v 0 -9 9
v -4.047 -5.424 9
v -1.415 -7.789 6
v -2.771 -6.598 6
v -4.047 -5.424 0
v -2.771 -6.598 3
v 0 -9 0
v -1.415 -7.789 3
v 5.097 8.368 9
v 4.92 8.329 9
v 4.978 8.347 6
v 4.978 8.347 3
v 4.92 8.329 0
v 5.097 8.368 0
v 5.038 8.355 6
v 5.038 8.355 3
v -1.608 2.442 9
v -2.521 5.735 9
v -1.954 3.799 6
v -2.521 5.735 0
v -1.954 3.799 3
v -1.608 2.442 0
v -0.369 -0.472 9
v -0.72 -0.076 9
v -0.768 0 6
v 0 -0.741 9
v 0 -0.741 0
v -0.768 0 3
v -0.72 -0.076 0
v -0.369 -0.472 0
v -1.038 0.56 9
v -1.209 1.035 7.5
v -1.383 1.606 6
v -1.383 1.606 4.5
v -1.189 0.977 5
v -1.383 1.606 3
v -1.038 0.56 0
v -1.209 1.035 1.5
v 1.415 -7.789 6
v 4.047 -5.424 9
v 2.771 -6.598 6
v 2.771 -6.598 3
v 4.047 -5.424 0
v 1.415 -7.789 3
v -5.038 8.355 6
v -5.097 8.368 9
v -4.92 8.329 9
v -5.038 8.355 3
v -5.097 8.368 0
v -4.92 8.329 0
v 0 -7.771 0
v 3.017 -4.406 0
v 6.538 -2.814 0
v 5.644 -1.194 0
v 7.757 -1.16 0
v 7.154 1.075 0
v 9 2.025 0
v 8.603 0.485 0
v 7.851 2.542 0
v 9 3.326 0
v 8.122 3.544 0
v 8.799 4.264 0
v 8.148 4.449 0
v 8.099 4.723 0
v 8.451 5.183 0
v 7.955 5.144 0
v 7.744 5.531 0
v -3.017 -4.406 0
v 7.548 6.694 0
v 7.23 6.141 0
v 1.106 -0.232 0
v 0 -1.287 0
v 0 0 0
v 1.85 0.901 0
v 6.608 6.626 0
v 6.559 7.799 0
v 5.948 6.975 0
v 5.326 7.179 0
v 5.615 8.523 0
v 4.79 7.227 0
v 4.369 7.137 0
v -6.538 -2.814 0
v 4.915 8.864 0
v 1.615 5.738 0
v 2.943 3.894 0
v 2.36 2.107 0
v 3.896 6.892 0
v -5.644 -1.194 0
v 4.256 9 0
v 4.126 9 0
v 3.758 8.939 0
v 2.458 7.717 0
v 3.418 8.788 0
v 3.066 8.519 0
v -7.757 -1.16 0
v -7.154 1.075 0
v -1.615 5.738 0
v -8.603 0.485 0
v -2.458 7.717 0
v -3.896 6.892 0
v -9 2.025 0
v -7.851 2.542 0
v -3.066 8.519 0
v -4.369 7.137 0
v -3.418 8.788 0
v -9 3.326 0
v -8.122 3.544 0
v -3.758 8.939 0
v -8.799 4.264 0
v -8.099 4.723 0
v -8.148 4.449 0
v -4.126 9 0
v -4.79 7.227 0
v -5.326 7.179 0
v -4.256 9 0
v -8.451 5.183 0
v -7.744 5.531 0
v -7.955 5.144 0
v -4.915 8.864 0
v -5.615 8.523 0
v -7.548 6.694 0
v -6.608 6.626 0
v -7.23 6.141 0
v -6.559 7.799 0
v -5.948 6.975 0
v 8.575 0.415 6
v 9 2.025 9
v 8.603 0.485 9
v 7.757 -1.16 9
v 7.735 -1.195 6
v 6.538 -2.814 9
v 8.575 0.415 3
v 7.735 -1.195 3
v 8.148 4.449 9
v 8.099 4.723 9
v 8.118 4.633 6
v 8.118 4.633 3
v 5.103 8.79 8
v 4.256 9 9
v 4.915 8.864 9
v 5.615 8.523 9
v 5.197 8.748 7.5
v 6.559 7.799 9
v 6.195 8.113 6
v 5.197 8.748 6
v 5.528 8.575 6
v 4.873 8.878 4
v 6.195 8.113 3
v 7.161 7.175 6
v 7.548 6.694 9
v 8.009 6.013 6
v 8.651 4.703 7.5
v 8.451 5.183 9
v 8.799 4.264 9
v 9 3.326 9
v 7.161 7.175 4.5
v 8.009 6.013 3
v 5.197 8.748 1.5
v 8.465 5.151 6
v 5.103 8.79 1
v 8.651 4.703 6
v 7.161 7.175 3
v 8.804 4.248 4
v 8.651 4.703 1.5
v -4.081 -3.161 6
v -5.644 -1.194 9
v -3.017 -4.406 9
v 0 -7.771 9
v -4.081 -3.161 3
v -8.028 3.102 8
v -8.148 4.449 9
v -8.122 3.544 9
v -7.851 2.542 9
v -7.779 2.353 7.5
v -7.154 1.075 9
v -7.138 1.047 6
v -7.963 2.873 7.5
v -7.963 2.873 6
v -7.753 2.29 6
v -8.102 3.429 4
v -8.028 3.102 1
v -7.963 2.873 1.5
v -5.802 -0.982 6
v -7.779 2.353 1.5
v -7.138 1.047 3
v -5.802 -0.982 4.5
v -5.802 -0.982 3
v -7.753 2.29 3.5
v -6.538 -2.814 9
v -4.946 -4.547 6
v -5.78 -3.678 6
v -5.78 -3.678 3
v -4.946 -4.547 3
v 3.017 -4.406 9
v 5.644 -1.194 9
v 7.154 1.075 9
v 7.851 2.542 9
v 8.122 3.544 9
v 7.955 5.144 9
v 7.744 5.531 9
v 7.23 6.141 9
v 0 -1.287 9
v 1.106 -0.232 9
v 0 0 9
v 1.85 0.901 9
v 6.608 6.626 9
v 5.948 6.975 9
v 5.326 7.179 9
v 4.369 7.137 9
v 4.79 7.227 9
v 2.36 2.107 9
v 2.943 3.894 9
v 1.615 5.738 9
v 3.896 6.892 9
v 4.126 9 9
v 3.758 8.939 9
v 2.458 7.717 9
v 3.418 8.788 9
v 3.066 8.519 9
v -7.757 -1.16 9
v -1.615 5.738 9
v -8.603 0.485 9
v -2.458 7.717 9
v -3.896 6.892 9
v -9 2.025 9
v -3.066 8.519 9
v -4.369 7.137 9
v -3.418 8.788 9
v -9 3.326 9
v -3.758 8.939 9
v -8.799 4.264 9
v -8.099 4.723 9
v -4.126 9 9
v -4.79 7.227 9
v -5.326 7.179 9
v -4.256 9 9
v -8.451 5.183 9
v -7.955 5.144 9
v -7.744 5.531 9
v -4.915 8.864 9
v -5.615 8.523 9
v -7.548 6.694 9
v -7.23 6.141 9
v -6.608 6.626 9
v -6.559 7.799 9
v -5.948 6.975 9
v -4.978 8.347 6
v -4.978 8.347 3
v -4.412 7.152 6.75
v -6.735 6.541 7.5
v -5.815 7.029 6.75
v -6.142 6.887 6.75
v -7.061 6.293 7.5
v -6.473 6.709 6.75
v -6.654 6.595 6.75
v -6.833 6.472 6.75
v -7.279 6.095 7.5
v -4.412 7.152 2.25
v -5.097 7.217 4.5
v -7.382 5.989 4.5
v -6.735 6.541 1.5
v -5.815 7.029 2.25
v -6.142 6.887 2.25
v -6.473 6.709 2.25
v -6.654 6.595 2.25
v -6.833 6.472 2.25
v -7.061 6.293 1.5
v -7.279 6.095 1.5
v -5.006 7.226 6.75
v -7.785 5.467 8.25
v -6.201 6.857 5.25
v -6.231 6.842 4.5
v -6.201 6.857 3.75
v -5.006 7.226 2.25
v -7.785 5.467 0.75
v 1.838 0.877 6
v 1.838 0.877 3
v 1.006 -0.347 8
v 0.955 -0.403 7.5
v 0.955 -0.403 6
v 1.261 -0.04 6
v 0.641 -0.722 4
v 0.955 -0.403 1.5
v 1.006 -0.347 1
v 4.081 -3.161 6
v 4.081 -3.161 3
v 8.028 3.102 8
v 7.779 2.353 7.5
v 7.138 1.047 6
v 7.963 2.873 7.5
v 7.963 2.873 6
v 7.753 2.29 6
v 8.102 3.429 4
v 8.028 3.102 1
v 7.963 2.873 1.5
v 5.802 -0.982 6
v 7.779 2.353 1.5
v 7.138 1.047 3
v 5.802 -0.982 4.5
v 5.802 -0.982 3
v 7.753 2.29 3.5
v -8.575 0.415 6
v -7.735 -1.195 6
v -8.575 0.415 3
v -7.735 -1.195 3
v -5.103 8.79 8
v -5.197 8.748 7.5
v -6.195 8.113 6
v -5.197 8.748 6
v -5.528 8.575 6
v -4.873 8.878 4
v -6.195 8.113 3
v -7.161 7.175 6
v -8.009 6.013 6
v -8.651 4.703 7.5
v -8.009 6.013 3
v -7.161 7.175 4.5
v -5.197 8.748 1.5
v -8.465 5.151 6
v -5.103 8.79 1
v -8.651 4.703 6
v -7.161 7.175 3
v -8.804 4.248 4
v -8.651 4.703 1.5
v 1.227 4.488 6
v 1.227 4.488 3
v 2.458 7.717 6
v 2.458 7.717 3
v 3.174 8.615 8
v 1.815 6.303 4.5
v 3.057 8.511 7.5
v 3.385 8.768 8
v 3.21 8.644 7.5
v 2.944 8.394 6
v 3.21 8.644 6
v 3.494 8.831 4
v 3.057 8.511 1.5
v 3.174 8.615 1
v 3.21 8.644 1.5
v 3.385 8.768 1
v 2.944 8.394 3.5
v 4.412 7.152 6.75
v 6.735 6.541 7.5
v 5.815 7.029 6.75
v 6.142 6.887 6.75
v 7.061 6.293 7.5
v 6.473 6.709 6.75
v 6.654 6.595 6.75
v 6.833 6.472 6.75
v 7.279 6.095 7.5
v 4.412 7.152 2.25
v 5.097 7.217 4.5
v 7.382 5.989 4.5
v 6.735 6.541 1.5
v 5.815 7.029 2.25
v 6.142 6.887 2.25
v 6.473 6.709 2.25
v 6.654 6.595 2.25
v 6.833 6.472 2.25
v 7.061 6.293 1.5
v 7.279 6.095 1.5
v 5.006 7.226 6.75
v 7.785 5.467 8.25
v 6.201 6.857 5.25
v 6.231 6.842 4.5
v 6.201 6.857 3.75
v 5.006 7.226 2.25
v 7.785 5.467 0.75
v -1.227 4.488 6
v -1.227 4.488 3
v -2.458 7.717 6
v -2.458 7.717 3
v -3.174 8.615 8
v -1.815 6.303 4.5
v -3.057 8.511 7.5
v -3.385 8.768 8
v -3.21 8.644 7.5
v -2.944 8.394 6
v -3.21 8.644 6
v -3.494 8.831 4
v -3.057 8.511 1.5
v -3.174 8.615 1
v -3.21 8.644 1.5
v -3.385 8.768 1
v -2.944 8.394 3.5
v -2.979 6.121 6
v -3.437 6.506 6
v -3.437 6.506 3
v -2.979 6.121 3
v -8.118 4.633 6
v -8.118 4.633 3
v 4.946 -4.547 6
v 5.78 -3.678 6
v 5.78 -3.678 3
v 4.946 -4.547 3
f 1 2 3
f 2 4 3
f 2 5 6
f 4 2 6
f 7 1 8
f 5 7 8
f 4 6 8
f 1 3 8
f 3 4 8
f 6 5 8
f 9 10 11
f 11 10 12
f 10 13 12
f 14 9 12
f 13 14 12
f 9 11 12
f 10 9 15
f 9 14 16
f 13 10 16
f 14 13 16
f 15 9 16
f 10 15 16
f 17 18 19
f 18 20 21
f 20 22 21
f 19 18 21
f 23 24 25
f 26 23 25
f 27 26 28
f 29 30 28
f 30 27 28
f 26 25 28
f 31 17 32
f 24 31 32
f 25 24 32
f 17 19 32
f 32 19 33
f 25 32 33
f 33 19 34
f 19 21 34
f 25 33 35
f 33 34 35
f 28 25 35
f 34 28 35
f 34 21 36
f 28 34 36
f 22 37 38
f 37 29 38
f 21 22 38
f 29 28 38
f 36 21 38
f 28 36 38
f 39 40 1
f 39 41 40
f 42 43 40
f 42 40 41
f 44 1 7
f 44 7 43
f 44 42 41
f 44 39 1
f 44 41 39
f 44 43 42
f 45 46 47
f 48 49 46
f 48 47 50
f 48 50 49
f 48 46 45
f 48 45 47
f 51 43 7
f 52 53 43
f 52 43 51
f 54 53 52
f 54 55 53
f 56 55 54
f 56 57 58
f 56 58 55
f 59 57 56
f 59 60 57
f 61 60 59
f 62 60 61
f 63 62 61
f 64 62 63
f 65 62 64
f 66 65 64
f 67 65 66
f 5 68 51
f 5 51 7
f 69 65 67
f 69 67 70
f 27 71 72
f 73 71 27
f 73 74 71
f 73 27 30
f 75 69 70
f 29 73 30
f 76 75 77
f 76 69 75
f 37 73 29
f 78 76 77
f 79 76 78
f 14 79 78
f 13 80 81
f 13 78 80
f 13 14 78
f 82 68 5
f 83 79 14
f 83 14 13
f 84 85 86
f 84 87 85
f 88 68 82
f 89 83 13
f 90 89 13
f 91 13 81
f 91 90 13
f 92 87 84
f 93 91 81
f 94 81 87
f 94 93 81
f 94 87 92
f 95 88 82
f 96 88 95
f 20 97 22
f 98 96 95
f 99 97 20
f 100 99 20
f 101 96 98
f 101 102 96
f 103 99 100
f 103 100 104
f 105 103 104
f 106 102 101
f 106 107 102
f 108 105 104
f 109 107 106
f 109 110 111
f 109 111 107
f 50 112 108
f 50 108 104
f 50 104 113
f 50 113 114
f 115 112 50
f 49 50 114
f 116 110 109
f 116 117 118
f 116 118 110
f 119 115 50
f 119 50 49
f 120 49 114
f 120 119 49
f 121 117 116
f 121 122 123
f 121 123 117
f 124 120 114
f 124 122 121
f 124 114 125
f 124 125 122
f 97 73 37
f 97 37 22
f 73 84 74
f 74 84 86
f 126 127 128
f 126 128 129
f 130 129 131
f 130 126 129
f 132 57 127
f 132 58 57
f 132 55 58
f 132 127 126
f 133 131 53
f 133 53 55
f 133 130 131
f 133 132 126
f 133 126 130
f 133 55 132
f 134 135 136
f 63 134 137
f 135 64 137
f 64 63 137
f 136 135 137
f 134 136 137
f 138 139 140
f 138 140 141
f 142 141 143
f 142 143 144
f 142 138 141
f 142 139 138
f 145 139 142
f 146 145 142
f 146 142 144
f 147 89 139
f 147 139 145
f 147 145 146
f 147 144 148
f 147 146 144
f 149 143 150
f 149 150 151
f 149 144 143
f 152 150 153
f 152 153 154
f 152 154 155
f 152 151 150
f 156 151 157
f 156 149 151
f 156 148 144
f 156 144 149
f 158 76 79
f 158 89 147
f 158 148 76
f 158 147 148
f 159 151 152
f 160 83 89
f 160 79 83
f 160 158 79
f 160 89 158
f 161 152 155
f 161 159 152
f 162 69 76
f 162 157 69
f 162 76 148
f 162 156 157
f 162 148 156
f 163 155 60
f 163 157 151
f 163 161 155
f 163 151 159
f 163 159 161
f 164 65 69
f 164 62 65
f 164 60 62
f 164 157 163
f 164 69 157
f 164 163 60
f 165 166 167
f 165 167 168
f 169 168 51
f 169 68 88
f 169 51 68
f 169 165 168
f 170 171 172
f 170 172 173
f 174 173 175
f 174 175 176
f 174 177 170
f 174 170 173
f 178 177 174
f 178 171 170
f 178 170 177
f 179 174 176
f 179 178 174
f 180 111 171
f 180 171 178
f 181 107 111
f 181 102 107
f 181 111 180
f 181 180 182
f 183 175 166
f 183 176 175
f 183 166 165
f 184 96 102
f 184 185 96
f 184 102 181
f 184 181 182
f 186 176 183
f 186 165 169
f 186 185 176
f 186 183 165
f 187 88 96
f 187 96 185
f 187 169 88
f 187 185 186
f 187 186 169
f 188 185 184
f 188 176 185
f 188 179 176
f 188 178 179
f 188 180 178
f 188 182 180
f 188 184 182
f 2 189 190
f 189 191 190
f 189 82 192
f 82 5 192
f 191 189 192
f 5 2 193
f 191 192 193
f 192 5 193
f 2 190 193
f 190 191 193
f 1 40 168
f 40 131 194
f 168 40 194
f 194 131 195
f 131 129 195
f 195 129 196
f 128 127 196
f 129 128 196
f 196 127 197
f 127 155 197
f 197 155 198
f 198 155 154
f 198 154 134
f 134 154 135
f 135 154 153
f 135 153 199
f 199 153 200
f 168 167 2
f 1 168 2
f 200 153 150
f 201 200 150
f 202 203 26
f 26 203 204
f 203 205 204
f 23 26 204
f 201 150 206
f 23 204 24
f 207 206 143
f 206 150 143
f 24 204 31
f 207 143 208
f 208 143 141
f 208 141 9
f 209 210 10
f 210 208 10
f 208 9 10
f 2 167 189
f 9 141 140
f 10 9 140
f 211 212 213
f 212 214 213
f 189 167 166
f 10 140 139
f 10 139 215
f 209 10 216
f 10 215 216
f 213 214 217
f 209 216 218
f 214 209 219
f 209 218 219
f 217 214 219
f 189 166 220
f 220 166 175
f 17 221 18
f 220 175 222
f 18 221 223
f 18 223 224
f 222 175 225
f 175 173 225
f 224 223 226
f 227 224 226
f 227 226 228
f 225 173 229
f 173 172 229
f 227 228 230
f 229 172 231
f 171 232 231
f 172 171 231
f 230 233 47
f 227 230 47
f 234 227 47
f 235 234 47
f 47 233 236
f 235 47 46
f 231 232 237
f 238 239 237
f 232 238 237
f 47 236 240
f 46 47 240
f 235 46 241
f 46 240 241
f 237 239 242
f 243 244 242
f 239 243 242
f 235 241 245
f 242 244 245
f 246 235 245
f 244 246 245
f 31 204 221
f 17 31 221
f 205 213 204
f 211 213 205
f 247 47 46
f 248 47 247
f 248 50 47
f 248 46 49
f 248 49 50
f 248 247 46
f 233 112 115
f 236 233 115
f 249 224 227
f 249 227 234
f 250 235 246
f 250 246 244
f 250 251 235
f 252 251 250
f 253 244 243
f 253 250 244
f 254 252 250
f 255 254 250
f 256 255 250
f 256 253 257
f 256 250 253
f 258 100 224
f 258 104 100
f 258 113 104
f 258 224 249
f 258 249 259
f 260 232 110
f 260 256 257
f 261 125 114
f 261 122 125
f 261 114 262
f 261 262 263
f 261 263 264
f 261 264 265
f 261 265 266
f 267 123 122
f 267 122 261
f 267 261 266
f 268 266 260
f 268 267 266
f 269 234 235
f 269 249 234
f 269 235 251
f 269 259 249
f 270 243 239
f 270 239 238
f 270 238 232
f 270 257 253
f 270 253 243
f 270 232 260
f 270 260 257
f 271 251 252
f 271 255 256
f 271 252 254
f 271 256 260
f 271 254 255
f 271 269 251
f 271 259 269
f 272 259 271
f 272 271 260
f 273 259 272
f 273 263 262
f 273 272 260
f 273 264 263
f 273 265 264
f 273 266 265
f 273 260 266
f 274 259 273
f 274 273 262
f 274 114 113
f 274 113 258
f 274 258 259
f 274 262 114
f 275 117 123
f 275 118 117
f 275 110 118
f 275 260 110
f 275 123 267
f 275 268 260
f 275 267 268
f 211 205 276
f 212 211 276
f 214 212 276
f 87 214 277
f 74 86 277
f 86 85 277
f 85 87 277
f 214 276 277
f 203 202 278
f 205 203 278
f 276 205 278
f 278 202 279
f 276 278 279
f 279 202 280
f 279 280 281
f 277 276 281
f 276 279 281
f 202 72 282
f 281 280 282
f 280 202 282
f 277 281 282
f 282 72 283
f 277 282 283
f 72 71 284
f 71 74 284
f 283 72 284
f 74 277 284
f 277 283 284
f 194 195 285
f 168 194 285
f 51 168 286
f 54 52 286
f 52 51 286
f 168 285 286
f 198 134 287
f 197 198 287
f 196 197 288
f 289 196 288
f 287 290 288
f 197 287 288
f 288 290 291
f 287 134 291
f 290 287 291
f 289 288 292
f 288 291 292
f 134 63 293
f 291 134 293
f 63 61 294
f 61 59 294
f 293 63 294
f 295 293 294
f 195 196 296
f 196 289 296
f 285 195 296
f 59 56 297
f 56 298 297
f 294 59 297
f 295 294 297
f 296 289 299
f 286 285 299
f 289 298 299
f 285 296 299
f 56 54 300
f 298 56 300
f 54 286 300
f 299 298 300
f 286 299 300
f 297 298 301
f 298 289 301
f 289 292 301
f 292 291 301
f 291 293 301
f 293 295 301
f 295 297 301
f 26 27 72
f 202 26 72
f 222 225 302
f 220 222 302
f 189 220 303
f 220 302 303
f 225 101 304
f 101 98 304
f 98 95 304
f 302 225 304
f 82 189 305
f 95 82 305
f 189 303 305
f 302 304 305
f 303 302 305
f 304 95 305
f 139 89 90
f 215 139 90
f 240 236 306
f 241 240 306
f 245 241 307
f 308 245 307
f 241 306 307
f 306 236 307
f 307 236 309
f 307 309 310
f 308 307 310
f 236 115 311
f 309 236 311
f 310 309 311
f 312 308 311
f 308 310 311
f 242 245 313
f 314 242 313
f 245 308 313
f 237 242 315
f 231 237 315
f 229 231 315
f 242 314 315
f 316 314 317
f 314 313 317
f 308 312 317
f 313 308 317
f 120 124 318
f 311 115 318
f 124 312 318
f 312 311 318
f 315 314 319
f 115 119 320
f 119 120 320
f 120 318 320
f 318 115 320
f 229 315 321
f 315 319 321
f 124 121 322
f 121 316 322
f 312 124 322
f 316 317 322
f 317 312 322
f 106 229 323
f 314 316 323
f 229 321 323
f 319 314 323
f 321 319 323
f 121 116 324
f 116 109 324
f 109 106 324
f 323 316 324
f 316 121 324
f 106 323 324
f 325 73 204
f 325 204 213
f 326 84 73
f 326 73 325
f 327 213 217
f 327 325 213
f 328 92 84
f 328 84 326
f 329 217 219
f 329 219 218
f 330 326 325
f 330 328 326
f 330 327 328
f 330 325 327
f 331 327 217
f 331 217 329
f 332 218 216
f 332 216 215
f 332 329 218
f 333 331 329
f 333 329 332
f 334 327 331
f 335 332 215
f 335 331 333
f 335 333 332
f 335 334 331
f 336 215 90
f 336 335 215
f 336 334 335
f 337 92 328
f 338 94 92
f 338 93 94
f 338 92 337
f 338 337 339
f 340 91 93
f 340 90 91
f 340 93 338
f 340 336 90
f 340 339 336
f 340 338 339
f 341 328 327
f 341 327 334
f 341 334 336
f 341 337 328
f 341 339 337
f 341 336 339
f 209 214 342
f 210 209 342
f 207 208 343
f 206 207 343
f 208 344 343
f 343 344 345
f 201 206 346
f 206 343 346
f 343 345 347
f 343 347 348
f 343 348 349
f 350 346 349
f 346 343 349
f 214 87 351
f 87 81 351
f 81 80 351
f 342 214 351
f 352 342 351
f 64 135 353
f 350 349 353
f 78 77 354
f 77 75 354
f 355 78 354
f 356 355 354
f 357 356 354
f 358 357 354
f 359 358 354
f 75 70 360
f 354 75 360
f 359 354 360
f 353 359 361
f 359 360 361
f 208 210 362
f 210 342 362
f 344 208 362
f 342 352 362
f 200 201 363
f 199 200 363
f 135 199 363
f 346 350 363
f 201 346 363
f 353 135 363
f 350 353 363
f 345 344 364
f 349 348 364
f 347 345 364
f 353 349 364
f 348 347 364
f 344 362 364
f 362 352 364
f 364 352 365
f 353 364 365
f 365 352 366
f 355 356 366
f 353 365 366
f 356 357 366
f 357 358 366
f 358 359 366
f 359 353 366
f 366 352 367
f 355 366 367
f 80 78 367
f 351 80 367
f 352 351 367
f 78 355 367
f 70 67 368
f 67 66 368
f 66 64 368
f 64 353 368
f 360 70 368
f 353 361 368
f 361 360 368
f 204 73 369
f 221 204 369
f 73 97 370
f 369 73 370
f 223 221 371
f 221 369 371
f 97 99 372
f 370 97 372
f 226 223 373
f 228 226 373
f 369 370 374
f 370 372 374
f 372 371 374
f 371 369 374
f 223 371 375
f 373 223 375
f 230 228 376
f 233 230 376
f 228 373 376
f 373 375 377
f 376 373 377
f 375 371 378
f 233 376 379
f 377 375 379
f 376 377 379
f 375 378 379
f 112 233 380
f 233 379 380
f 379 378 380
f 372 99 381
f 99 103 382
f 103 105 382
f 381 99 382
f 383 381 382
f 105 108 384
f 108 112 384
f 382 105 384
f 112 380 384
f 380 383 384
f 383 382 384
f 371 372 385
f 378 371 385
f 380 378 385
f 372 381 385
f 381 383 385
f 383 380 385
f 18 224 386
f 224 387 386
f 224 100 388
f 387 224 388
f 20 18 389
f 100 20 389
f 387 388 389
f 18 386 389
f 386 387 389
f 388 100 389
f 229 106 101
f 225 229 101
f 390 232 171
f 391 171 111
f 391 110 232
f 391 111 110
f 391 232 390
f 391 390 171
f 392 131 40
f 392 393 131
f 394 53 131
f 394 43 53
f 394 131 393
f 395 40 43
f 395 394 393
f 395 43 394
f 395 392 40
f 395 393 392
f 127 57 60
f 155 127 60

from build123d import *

# Parameters (mm, degrees)
F1_DEPTH = 9
F2_DEPTH = 9


with BuildPart() as f1:
    # F0 (on Top) → F1 (new body)
    with BuildSketch(Plane.XY):
        with BuildLine():
            Line((0, -0.7413188443), (0, 0))
            add(Edge.make_bspline(
                [(0, 0), (-1.3695573068, 4.8905538115), (-2.0943165887, 8.9170896379), (-4.1255794242, 9)],
                knots=[0, 0, 0, 0, 0.3214605719, 0.3214605719, 0.3214605719, 0.3214605719], degree=3))
            Line((-4.1255794242, 9), (-4.2564818249, 9))
            add(Edge.make_bspline(
                [(-4.2564818249, 9), (-6.0240025483, 8.9302818998), (-8.6524833172, 6.0954684063), (-9, 3.3264504746)],
                knots=[0.3282756179, 0.3282756179, 0.3282756179, 0.3282756179, 0.6008737875, 0.6008737875, 0.6008737875, 0.6008737875], degree=3))
            Line((-9, 3.3264504746), (-9, 2.0254198861))
            add(Edge.make_bspline(
                [(-9, 2.0254198861), (-8.8027461578, 0.4124014883), (-7.8936230463, -1.1881125431), (-6.5381361873, -2.8137259055)],
                knots=[0.643703554, 0.643703554, 0.643703554, 0.643703554, 0.8034248169, 0.8034248169, 0.8034248169, 0.8034248169], degree=3))
            add(Edge.make_bspline(
                [(-7.0166951045, 7.2174789384), (-7.8491774617, 6.3542855977), (-9.3849521871, 3.9558156461), (-8.6108826872, 0.0318026512), (-6.9725173385, -2.272586495), (-6.5381361873, -2.8137259055)],
                knots=[0.4449683799, 0.4449683799, 0.4449683799, 0.4449683799, 0.5659455054, 0.7097029057, 0.7555145045, 0.7555145045, 0.7555145045, 0.7555145045], degree=3))
            add(Edge.make_bspline(
                [(-5.09737432, 8.3675803617), (-5.6442828481, 8.4181907516), (-6.369925564, 7.8881083584), (-7.0166951045, 7.2174789384)],
                knots=[0.3509792171, 0.3509792171, 0.3509792171, 0.3509792171, 0.4449683799, 0.4449683799, 0.4449683799, 0.4449683799], degree=3))
            add(Edge.make_bspline(
                [(-4.9200605163, 8.3289773014), (-4.9770953319, 8.3489564565), (-5.0361135483, 8.3619113487), (-5.09737432, 8.3675803617)],
                knots=[0.340451225, 0.340451225, 0.340451225, 0.340451225, 0.3509792171, 0.3509792171, 0.3509792171, 0.3509792171], degree=3))
            add(Edge.make_bspline(
                [(-4.9200605163, 8.3289773014), (-4.4286259103, 8.2194748549), (-3.4589288417, 7.9403428532), (-2.8035900144, 6.5506876616), (-2.5205168272, 5.7354818302)],
                knots=[0.0219652467, 0.0219652467, 0.0219652467, 0.0219652467, 0.2048477067, 0.3890772859, 0.3890772859, 0.3890772859, 0.3890772859], degree=3))
            add(Edge.make_bspline(
                [(-2.5205168272, 5.7354818302), (-2.3111984159, 5.1326780419), (-1.7039003011, 2.9337634373), (-1.0482096873, -0.0435395693), (-0.2666692877, -0.5638009877), (0, -0.7413188443)],
                knots=[0.3890772859, 0.3890772859, 0.3890772859, 0.3890772859, 0.5253058113, 0.8380297251, 1, 1, 1, 1], degree=3))
        make_face()
        with BuildLine():
            add(Edge.make_bspline(
                [(-3.8956142962, 6.891802419), (-3.4381051858, 6.5060647515), (-2.9780259376, 6.1212194977), (-2.5205168272, 5.7354818302)],
                knots=[0, 0, 0, 0, 1.796655324, 1.796655324, 1.796655324, 1.796655324], degree=3))
            add(Edge.make_bspline(
                [(-4.9200605163, 8.3289773014), (-4.4286259103, 8.2194748549), (-3.4589288417, 7.9403428532), (-2.8035900144, 6.5506876616), (-2.5205168272, 5.7354818302)],
                knots=[0.0219652467, 0.0219652467, 0.0219652467, 0.0219652467, 0.2048477067, 0.3890772859, 0.3890772859, 0.3890772859, 0.3890772859], degree=3))
            add(Edge.make_bspline(
                [(-3.8956142962, 6.891802419), (-4.1987079785, 7.6723908012), (-4.5074935852, 8.1844561238), (-4.9200605163, 8.3289773014)],
                knots=[0.2642959622, 0.2642959622, 0.2642959622, 0.2642959622, 0.340451225, 0.340451225, 0.340451225, 0.340451225], degree=3))
        make_face()
        with BuildLine():
            add(Edge.make_bspline(
                [(-3.8956142962, 6.891802419), (-4.2213452753, 7.0869586014), (-5.1237543979, 7.6276218222), (-7.7497584624, 6.1743324677), (-8.0986041576, 4.7228783369)],
                knots=[0, 0, 0, 0, 0.1605538932, 0.4448005452, 0.4448005452, 0.4448005452, 0.4448005452], degree=3))
            add(Edge.make_bspline(
                [(-3.8956142962, 6.891802419), (-4.1987079785, 7.6723908012), (-4.5074935852, 8.1844561238), (-4.9200605163, 8.3289773014)],
                knots=[0.2642959622, 0.2642959622, 0.2642959622, 0.2642959622, 0.340451225, 0.340451225, 0.340451225, 0.340451225], degree=3))
            add(Edge.make_bspline(
                [(-5.09737432, 8.3675803617), (-5.0382294946, 8.3548547711), (-4.9790846696, 8.3421291819), (-4.9200605163, 8.3289773014)],
                knots=[0, 0, 0, 0, 0.0219652467, 0.0219652467, 0.0219652467, 0.0219652467], degree=3))
            add(Edge.make_bspline(
                [(-5.09737432, 8.3675803617), (-5.6442828481, 8.4181907516), (-6.369925564, 7.8881083584), (-7.0166951045, 7.2174789384)],
                knots=[0.3509792171, 0.3509792171, 0.3509792171, 0.3509792171, 0.4449683799, 0.4449683799, 0.4449683799, 0.4449683799], degree=3))
            add(Edge.make_bspline(
                [(-7.0166951045, 7.2174789384), (-7.4551353354, 6.468842273), (-7.8935756458, 5.7202055859), (-8.0986041576, 4.7228783369)],
                knots=[0, 0, 0, 0, 0.2568105942, 0.2568105942, 0.2568105942, 0.2568105942], degree=3))
        make_face()
        with BuildLine():
            add(Edge.make_bspline(
                [(-6.5381361873, -2.8137259055), (-5.8199444715, -3.6750415592), (-4.976444676, -4.5434033696), (-4.0471287706, -5.424404607)],
                knots=[0.8034248169, 0.8034248169, 0.8034248169, 0.8034248169, 0.8880515967, 0.8880515967, 0.8880515967, 0.8880515967], degree=3))
            add(Edge.make_bspline(
                [(-8.1480962796, 4.4487735667), (-8.3487195408, 3.1674182287), (-7.9933424316, -0.4652337496), (-5.465399807, -3.6634353226), (-4.0471287706, -5.424404607)],
                knots=[0.2798373043, 0.2798373043, 0.2798373043, 0.2798373043, 0.5962275969, 0.9861211234, 0.9861211234, 0.9861211234, 0.9861211234], degree=3))
            add(Edge.make_bspline(
                [(-8.0986041689, 4.7228782896), (-8.1200921294, 4.6334725946), (-8.136536481, 4.5420835041), (-8.1480962796, 4.4487735667)],
                knots=[0.4448005483, 0.4448005483, 0.4448005483, 0.4448005483, 0.4623093822, 0.4623093822, 0.4623093822, 0.4623093822], degree=3))
            add(Edge.make_bspline(
                [(-7.0166951045, 7.2174789384), (-7.4551353354, 6.468842273), (-7.8935756458, 5.7202055859), (-8.0986041576, 4.7228783369)],
                knots=[0, 0, 0, 0, 0.2568105942, 0.2568105942, 0.2568105942, 0.2568105942], degree=3))
            add(Edge.make_bspline(
                [(-7.0166951045, 7.2174789384), (-7.8491774617, 6.3542855977), (-9.3849521871, 3.9558156461), (-8.6108826872, 0.0318026512), (-6.9725173385, -2.272586495), (-6.5381361873, -2.8137259055)],
                knots=[0.4449683799, 0.4449683799, 0.4449683799, 0.4449683799, 0.5659455054, 0.7097029057, 0.7555145045, 0.7555145045, 0.7555145045, 0.7555145045], degree=3))
        make_face()
        with BuildLine():
            add(Edge.make_bspline(
                [(-4.0471287706, -5.424404607), (-2.8177846774, -6.5898357171), (-1.4382685717, -7.7773849141), (0, -9)],
                knots=[0.8880515967, 0.8880515967, 0.8880515967, 0.8880515967, 1, 1, 1, 1], degree=3))
            Line((0, -9), (0, -7.7708214521))
            add(Edge.make_bspline(
                [(-8.1480962796, 4.4487735667), (-8.503093949, 1.5832556149), (-4.2515467883, -3.0937826707), (0, -7.7708214521)],
                knots=[0.4623093822, 0.4623093822, 0.4623093822, 0.4623093822, 1, 1, 1, 1], degree=3))
            add(Edge.make_bspline(
                [(-8.1480962796, 4.4487735667), (-8.3487195408, 3.1674182287), (-7.9933424316, -0.4652337496), (-5.465399807, -3.6634353226), (-4.0471287706, -5.424404607)],
                knots=[0.2798373043, 0.2798373043, 0.2798373043, 0.2798373043, 0.5962275969, 0.9861211234, 0.9861211234, 0.9861211234, 0.9861211234], degree=3))
        make_face()
    extrude(amount=F1_DEPTH)

    # F0 (on Top) → F2 (join)
    with BuildSketch(Plane.XY):
        with BuildLine():
            add(Edge.make_bspline(
                [(4.2564818249, 9), (6.0240025483, 8.9302818998), (8.6524833172, 6.0954684063), (9, 3.3264504746)],
                knots=[0.3282756179, 0.3282756179, 0.3282756179, 0.3282756179, 0.6008737875, 0.6008737875, 0.6008737875, 0.6008737875], degree=3))
            Line((4.2564818249, 9), (4.1255794242, 9))
            add(Edge.make_bspline(
                [(0, 0), (1.3695573068, 4.8905538115), (2.0943165887, 8.9170896379), (4.1255794242, 9)],
                knots=[0, 0, 0, 0, 0.3214605719, 0.3214605719, 0.3214605719, 0.3214605719], degree=3))
            Line((0, 0), (0, -0.7413188443))
            add(Edge.make_bspline(
                [(2.5205168272, 5.7354818302), (2.3111984159, 5.1326780419), (1.7039003011, 2.9337634373), (1.0482096873, -0.0435395693), (0.2666692877, -0.5638009877), (0, -0.7413188443)],
                knots=[0.3890772859, 0.3890772859, 0.3890772859, 0.3890772859, 0.5253058113, 0.8380297251, 1, 1, 1, 1], degree=3))
            add(Edge.make_bspline(
                [(4.9200605163, 8.3289773014), (4.4286259103, 8.2194748549), (3.4589288417, 7.9403428532), (2.8035900144, 6.5506876616), (2.5205168272, 5.7354818302)],
                knots=[0.0219652467, 0.0219652467, 0.0219652467, 0.0219652467, 0.2048477067, 0.3890772859, 0.3890772859, 0.3890772859, 0.3890772859], degree=3))
            add(Edge.make_bspline(
                [(4.9200605163, 8.3289773014), (4.9770953319, 8.3489564565), (5.0361135483, 8.3619113487), (5.09737432, 8.3675803617)],
                knots=[0.340451225, 0.340451225, 0.340451225, 0.340451225, 0.3509792171, 0.3509792171, 0.3509792171, 0.3509792171], degree=3))
            add(Edge.make_bspline(
                [(5.09737432, 8.3675803617), (5.6442828481, 8.4181907516), (6.369925564, 7.8881083584), (7.0166951045, 7.2174789384)],
                knots=[0.3509792171, 0.3509792171, 0.3509792171, 0.3509792171, 0.4449683799, 0.4449683799, 0.4449683799, 0.4449683799], degree=3))
            add(Edge.make_bspline(
                [(7.0166951045, 7.2174789384), (7.8491774617, 6.3542855977), (9.3849521871, 3.9558156461), (8.6108826872, 0.0318026512), (6.9725173385, -2.272586495), (6.5381361873, -2.8137259055)],
                knots=[0.4449683799, 0.4449683799, 0.4449683799, 0.4449683799, 0.5659455054, 0.7097029057, 0.7555145045, 0.7555145045, 0.7555145045, 0.7555145045], degree=3))
            add(Edge.make_bspline(
                [(9, 2.0254198861), (8.8027461578, 0.4124014883), (7.8936230463, -1.1881125431), (6.5381361873, -2.8137259055)],
                knots=[0.643703554, 0.643703554, 0.643703554, 0.643703554, 0.8034248169, 0.8034248169, 0.8034248169, 0.8034248169], degree=3))
            Line((9, 2.0254198861), (9, 3.3264504746))
        make_face()
        with BuildLine():
            add(Edge.make_bspline(
                [(2.5205168272, 5.7354818302), (2.3111984159, 5.1326780419), (1.7039003011, 2.9337634373), (1.0482096873, -0.0435395693), (0.2666692877, -0.5638009877), (0, -0.7413188443)],
                knots=[0.3890772859, 0.3890772859, 0.3890772859, 0.3890772859, 0.5253058113, 0.8380297251, 1, 1, 1, 1], degree=3))
            Line((0, -0.7413188443), (0, -1.2867490295))
            add(Edge.make_bspline(
                [(0, -1.2867490295), (0.6447495044, -0.7413188443), (2.2543017403, 0.6202928221), (3.2650913115, 5.2679516253), (3.8956142962, 6.891802419)],
                knots=[0, 0, 0, 0, 0.105870873, 0.2642959622, 0.2642959622, 0.2642959622, 0.2642959622], degree=3))
            add(Edge.make_bspline(
                [(3.8956142962, 6.891802419), (3.4381051858, 6.5060647515), (2.9780259376, 6.1212194977), (2.5205168272, 5.7354818302)],
                knots=[0, 0, 0, 0, 1.796655324, 1.796655324, 1.796655324, 1.796655324], degree=3))
        make_face()
        with BuildLine():
            add(Edge.make_bspline(
                [(6.5381361873, -2.8137259055), (5.8199444715, -3.6750415592), (4.976444676, -4.5434033696), (4.0471287706, -5.424404607)],
                knots=[0.8034248169, 0.8034248169, 0.8034248169, 0.8034248169, 0.8880515967, 0.8880515967, 0.8880515967, 0.8880515967], degree=3))
            add(Edge.make_bspline(
                [(7.0166951045, 7.2174789384), (7.8491774617, 6.3542855977), (9.3849521871, 3.9558156461), (8.6108826872, 0.0318026512), (6.9725173385, -2.272586495), (6.5381361873, -2.8137259055)],
                knots=[0.4449683799, 0.4449683799, 0.4449683799, 0.4449683799, 0.5659455054, 0.7097029057, 0.7555145045, 0.7555145045, 0.7555145045, 0.7555145045], degree=3))
            add(Edge.make_bspline(
                [(7.0166951045, 7.2174789384), (7.4551353354, 6.468842273), (7.8935756458, 5.7202055859), (8.0986041576, 4.7228783369)],
                knots=[0, 0, 0, 0, 0.2568105942, 0.2568105942, 0.2568105942, 0.2568105942], degree=3))
            add(Edge.make_bspline(
                [(8.0986041689, 4.7228782896), (8.1200921294, 4.6334725946), (8.136536481, 4.5420835041), (8.1480962796, 4.4487735667)],
                knots=[0.4448005483, 0.4448005483, 0.4448005483, 0.4448005483, 0.4623093822, 0.4623093822, 0.4623093822, 0.4623093822], degree=3))
            add(Edge.make_bspline(
                [(8.1480962796, 4.4487735667), (8.3487195408, 3.1674182287), (7.9933424316, -0.4652337496), (5.465399807, -3.6634353226), (4.0471287706, -5.424404607)],
                knots=[0.2798373043, 0.2798373043, 0.2798373043, 0.2798373043, 0.5962275969, 0.9861211234, 0.9861211234, 0.9861211234, 0.9861211234], degree=3))
        make_face()
        with BuildLine():
            add(Edge.make_bspline(
                [(4.0471287706, -5.424404607), (2.8177846774, -6.5898357171), (1.4382685717, -7.7773849141), (0, -9)],
                knots=[0.8880515967, 0.8880515967, 0.8880515967, 0.8880515967, 1, 1, 1, 1], degree=3))
            add(Edge.make_bspline(
                [(8.1480962796, 4.4487735667), (8.3487195408, 3.1674182287), (7.9933424316, -0.4652337496), (5.465399807, -3.6634353226), (4.0471287706, -5.424404607)],
                knots=[0.2798373043, 0.2798373043, 0.2798373043, 0.2798373043, 0.5962275969, 0.9861211234, 0.9861211234, 0.9861211234, 0.9861211234], degree=3))
            add(Edge.make_bspline(
                [(8.1480962796, 4.4487735667), (8.503093949, 1.5832556149), (4.2515467883, -3.0937826707), (0, -7.7708214521)],
                knots=[0.4623093822, 0.4623093822, 0.4623093822, 0.4623093822, 1, 1, 1, 1], degree=3))
            Line((0, -7.7708214521), (0, -9))
        make_face()
        with BuildLine():
            add(Edge.make_bspline(
                [(4.9200605163, 8.3289773014), (4.4286259103, 8.2194748549), (3.4589288417, 7.9403428532), (2.8035900144, 6.5506876616), (2.5205168272, 5.7354818302)],
                knots=[0.0219652467, 0.0219652467, 0.0219652467, 0.0219652467, 0.2048477067, 0.3890772859, 0.3890772859, 0.3890772859, 0.3890772859], degree=3))
            add(Edge.make_bspline(
                [(3.8956142962, 6.891802419), (3.4381051858, 6.5060647515), (2.9780259376, 6.1212194977), (2.5205168272, 5.7354818302)],
                knots=[0, 0, 0, 0, 1.796655324, 1.796655324, 1.796655324, 1.796655324], degree=3))
            add(Edge.make_bspline(
                [(3.8956142962, 6.891802419), (4.1987079785, 7.6723908012), (4.5074935852, 8.1844561238), (4.9200605163, 8.3289773014)],
                knots=[0.2642959622, 0.2642959622, 0.2642959622, 0.2642959622, 0.340451225, 0.340451225, 0.340451225, 0.340451225], degree=3))
        make_face()
        with BuildLine():
            add(Edge.make_bspline(
                [(7.0166951045, 7.2174789384), (7.4551353354, 6.468842273), (7.8935756458, 5.7202055859), (8.0986041576, 4.7228783369)],
                knots=[0, 0, 0, 0, 0.2568105942, 0.2568105942, 0.2568105942, 0.2568105942], degree=3))
            add(Edge.make_bspline(
                [(5.09737432, 8.3675803617), (5.6442828481, 8.4181907516), (6.369925564, 7.8881083584), (7.0166951045, 7.2174789384)],
                knots=[0.3509792171, 0.3509792171, 0.3509792171, 0.3509792171, 0.4449683799, 0.4449683799, 0.4449683799, 0.4449683799], degree=3))
            add(Edge.make_bspline(
                [(5.09737432, 8.3675803617), (5.0382294946, 8.3548547711), (4.9790846696, 8.3421291819), (4.9200605163, 8.3289773014)],
                knots=[0, 0, 0, 0, 0.0219652467, 0.0219652467, 0.0219652467, 0.0219652467], degree=3))
            add(Edge.make_bspline(
                [(3.8956142962, 6.891802419), (4.1987079785, 7.6723908012), (4.5074935852, 8.1844561238), (4.9200605163, 8.3289773014)],
                knots=[0.2642959622, 0.2642959622, 0.2642959622, 0.2642959622, 0.340451225, 0.340451225, 0.340451225, 0.340451225], degree=3))
            add(Edge.make_bspline(
                [(3.8956142962, 6.891802419), (4.2213452753, 7.0869586014), (5.1237543979, 7.6276218222), (7.7497584624, 6.1743324677), (8.0986041576, 4.7228783369)],
                knots=[0, 0, 0, 0, 0.1605538932, 0.4448005452, 0.4448005452, 0.4448005452, 0.4448005452], degree=3))
        make_face()
    extrude(amount=F2_DEPTH)


solid = f1.part
